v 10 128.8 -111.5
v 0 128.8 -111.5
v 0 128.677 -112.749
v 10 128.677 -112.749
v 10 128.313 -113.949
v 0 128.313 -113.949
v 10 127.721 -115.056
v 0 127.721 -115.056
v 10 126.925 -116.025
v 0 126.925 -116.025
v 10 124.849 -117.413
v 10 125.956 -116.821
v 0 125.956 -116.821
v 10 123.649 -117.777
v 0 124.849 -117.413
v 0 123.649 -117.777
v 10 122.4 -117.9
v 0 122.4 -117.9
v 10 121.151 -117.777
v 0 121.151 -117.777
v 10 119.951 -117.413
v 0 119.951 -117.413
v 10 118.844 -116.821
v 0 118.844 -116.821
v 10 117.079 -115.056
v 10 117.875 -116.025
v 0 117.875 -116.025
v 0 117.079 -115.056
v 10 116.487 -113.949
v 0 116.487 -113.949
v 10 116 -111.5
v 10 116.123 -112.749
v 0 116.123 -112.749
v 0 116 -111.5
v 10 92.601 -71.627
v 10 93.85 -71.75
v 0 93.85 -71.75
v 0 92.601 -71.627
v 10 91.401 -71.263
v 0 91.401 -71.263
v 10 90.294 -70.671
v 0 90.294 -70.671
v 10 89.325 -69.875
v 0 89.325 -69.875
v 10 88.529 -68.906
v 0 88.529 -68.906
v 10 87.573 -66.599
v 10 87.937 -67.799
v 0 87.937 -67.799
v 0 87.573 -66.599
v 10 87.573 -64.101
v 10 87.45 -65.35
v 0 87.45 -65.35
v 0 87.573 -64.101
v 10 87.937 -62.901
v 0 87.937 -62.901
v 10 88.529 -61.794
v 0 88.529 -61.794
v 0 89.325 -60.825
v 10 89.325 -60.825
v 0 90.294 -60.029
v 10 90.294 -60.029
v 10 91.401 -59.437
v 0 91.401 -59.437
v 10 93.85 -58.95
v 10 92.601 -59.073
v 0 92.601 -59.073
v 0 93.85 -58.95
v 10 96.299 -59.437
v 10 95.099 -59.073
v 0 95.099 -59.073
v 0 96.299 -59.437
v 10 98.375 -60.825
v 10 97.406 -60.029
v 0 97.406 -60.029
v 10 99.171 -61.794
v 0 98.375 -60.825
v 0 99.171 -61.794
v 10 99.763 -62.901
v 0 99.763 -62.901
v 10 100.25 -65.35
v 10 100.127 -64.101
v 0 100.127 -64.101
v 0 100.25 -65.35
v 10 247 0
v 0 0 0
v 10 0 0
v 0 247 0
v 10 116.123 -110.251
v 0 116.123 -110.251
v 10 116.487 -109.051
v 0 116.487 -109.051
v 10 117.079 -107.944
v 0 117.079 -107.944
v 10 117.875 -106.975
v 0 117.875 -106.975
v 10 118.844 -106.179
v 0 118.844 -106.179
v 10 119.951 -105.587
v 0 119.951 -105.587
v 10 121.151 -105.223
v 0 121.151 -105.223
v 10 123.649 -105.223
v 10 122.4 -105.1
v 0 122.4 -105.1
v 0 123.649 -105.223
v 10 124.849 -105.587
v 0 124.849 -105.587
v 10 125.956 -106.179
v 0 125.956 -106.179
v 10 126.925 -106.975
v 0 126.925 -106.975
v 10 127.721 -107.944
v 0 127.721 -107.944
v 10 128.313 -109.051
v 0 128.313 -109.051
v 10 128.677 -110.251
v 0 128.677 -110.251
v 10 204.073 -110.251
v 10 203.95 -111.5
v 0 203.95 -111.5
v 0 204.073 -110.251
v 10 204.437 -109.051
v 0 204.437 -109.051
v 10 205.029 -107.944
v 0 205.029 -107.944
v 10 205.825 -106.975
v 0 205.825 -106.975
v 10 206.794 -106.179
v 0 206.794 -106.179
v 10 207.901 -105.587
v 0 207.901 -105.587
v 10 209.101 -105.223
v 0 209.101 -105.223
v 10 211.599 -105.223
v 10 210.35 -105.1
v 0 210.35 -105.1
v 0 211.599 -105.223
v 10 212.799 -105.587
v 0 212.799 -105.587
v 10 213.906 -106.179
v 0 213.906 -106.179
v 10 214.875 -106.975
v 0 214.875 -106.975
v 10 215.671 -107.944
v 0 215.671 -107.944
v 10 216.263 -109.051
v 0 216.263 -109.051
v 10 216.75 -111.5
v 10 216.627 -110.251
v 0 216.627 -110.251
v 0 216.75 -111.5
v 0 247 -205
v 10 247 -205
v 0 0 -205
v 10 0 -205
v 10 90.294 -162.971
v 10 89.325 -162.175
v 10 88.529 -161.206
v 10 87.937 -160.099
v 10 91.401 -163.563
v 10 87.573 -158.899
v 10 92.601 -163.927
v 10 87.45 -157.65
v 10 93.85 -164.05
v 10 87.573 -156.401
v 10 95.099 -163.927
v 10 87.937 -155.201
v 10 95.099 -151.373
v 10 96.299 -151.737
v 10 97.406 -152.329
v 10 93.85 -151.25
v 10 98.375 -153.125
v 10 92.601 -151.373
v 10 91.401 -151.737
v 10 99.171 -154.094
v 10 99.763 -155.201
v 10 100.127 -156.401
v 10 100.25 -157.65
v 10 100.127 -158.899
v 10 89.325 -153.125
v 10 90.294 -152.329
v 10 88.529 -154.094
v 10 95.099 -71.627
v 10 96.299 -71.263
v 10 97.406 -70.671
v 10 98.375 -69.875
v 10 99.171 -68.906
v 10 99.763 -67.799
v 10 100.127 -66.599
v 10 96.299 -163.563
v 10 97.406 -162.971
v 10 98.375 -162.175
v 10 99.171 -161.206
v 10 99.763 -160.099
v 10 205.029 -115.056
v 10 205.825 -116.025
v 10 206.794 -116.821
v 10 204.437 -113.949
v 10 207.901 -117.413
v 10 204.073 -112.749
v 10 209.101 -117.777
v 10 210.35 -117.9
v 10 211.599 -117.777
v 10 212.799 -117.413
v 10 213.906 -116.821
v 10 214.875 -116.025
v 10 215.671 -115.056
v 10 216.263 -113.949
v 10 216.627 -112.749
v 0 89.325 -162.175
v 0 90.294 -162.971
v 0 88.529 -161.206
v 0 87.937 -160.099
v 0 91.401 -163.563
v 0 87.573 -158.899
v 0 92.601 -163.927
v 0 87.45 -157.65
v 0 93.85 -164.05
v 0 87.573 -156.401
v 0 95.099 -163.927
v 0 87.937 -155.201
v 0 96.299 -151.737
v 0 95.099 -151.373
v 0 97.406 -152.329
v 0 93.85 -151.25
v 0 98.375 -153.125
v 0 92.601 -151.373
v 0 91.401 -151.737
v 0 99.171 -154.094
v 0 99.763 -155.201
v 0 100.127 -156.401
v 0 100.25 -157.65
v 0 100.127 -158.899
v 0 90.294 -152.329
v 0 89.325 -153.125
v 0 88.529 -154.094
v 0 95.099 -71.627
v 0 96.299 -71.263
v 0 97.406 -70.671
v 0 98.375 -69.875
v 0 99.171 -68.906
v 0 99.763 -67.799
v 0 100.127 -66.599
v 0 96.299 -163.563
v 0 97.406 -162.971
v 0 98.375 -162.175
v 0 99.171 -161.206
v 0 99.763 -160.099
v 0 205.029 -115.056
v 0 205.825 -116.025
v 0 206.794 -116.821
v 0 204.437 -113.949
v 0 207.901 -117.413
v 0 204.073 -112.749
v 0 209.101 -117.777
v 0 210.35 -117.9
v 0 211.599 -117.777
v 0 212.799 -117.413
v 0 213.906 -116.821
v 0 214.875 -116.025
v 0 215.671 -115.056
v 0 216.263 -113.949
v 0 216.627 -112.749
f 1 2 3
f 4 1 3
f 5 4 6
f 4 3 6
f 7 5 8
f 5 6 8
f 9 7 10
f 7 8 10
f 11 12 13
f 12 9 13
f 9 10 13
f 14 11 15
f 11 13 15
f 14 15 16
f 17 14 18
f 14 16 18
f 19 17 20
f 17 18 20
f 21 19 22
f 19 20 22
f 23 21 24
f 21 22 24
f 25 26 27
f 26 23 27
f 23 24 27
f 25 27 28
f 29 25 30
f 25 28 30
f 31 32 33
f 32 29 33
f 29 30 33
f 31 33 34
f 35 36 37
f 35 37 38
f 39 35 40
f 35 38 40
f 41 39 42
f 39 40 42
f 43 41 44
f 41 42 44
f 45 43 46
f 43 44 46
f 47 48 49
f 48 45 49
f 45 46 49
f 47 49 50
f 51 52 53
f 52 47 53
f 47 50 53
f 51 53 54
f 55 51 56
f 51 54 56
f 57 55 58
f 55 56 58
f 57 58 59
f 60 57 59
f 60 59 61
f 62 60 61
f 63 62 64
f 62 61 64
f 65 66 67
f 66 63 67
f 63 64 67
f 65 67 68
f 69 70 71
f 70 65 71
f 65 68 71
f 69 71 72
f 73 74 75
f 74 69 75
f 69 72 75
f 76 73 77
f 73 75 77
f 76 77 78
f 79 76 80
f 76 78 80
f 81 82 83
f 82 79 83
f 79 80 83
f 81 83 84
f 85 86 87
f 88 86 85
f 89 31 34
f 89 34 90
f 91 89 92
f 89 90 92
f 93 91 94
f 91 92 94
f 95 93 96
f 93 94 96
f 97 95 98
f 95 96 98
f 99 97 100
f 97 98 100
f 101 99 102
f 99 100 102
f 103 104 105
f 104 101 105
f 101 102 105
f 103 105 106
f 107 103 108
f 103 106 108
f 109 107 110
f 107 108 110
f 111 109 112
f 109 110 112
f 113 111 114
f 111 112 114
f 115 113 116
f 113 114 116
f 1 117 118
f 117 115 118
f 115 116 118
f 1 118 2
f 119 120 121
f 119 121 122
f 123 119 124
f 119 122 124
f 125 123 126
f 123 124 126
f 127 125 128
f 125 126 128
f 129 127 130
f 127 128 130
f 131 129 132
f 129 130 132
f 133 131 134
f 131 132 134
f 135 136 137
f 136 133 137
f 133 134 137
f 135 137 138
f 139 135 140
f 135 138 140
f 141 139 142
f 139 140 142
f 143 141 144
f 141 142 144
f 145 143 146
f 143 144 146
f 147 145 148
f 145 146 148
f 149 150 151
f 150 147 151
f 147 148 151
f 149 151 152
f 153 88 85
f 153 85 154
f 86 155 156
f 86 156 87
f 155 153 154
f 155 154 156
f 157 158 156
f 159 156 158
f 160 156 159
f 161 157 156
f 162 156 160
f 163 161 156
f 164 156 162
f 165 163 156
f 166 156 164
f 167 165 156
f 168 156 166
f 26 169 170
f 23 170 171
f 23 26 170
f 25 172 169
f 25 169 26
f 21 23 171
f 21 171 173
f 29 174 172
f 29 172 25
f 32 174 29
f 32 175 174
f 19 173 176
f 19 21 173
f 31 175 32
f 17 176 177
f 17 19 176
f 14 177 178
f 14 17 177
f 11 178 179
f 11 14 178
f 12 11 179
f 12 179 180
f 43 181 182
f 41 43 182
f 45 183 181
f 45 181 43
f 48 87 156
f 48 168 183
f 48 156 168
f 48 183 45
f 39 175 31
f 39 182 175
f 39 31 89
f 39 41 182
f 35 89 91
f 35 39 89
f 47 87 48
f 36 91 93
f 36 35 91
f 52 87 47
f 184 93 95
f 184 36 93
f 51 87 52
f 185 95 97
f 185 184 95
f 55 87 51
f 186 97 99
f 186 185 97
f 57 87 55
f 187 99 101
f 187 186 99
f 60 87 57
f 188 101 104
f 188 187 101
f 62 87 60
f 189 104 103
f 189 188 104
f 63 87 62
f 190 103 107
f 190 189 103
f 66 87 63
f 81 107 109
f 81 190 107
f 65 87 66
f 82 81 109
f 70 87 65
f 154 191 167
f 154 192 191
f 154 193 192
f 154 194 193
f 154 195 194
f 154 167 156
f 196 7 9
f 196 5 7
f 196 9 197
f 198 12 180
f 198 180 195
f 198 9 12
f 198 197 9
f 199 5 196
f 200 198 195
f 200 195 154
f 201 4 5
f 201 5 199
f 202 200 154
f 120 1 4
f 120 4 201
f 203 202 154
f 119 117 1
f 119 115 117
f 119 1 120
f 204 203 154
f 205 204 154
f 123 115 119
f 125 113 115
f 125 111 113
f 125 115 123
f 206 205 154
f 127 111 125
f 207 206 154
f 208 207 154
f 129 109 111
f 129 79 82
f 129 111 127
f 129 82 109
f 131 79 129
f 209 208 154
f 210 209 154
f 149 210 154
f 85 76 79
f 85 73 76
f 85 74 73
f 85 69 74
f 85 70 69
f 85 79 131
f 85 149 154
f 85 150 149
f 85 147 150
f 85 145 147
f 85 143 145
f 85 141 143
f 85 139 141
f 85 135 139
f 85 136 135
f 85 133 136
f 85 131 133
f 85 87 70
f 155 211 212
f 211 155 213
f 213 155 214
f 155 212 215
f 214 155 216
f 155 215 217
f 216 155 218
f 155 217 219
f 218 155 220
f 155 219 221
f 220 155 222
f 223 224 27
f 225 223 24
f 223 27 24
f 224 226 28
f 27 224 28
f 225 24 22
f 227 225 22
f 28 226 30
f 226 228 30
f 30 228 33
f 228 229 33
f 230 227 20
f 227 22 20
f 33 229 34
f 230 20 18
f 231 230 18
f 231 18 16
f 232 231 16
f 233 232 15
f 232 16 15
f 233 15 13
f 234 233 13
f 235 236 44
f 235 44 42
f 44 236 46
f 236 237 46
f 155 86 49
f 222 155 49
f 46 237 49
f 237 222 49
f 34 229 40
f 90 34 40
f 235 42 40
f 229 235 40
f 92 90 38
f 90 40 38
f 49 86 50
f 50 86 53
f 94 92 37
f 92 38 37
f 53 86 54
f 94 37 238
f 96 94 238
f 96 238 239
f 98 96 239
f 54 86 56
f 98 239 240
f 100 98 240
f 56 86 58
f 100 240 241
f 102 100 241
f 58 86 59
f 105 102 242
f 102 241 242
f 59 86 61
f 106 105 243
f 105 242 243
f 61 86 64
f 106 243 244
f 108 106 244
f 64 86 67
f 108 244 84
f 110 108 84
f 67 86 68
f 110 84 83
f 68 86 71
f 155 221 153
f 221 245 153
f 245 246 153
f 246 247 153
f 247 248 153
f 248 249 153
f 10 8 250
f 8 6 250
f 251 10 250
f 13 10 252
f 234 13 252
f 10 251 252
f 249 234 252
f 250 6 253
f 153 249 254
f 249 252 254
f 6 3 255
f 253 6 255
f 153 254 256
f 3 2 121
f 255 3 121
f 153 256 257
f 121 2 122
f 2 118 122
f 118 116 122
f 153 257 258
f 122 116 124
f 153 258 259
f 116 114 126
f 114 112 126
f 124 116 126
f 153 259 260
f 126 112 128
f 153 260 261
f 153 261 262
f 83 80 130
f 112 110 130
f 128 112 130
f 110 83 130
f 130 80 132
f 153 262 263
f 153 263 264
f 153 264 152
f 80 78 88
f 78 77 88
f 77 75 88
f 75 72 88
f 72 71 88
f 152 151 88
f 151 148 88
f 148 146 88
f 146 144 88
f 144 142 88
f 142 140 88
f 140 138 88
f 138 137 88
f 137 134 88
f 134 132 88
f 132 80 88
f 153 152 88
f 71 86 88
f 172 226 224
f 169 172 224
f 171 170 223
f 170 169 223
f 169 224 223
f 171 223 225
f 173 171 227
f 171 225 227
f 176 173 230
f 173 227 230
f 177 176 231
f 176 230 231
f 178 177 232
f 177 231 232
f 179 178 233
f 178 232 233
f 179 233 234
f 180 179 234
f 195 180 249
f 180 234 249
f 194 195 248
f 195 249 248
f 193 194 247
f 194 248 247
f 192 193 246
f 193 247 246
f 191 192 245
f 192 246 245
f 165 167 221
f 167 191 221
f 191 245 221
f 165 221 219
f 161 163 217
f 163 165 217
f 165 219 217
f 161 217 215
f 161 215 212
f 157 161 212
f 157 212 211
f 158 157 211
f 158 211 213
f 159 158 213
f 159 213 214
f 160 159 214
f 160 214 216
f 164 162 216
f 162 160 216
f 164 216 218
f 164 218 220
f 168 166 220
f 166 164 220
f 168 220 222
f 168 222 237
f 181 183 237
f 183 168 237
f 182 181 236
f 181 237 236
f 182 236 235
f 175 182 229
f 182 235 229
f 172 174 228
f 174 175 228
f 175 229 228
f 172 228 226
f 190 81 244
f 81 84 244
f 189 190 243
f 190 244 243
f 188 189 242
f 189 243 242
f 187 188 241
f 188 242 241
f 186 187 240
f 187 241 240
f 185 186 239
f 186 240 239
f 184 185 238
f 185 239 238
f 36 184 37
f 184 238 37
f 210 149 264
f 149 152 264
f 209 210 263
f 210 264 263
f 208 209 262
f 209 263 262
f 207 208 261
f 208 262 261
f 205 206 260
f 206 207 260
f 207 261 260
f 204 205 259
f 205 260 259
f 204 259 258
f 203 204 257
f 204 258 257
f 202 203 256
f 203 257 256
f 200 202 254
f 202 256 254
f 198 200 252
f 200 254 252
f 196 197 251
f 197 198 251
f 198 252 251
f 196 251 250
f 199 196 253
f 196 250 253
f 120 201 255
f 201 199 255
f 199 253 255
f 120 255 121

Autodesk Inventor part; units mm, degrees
ref_plane "YZ Plane" through (0, 0, 0) normal (1, 0, 0) x (0, 1, 0)
ref_plane "XZ Plane" through (0, 0, 0) normal (0, 1, 0) x (-1, 0, 0)
ref_plane "XY Plane" through (0, 0, 0) normal (0, 0, 1) x (1, 0, 0)
sketch "Sketch1" plane through (0, 0, 0) normal (1, 0, 0) x (0, 1, 0)
  line L0 (0, 0) -> (247, 0)
  line L1 (247, 0) -> (247, -205)
  line L2 (247, -205) -> (0, -205)
  line L3 (0, -205) -> (0, 0)
  circle A0 centre (93.85, -65.35) radius 6.4
  circle A1 centre (93.85, -157.65) radius 6.4
  line L4 (93.85, -65.35) -> (93.85, -157.65)
  circle A2 centre (122.4, -111.5) radius 6.4
  line L5 (122.4, -111.5) -> (116, -111.5)
  line L6 (116, -111.5) -> (210.35, -111.5)
  circle A3 centre (210.35, -111.5) radius 6.4
  point P0 (122.35, 111.5)
  dimension "d5" = 12.8
  dimension "d0" = 247
  dimension "d1" = 205
  dimension "d3" = 12.8
  dimension "d4" = 92.3
  dimension "d6" = 94.35
  dimension "d7" = 12.8
  dimension "d10" = 12.8
extrude "Extrusion1" add sketch "Sketch1" along normal blind 10
properties part number "bigwall"
